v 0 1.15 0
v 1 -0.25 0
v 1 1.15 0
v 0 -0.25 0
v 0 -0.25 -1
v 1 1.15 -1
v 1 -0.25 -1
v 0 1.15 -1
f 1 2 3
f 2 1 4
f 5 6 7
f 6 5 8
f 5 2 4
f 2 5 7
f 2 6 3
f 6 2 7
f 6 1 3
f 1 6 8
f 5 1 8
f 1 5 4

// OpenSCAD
//------------------------------------------------------
// Base
// BAse
// 5@xes 15/07/2022
// Size Must be close to 1x1 !
//------------------------------------------------------

$fn=20;


//render() translate([0.5,0,0]) mirror([1,0,0]) letter("/");
render() translate([0,-0.25,-1]) cube(size = [1.0,1.4,1], center = false);
